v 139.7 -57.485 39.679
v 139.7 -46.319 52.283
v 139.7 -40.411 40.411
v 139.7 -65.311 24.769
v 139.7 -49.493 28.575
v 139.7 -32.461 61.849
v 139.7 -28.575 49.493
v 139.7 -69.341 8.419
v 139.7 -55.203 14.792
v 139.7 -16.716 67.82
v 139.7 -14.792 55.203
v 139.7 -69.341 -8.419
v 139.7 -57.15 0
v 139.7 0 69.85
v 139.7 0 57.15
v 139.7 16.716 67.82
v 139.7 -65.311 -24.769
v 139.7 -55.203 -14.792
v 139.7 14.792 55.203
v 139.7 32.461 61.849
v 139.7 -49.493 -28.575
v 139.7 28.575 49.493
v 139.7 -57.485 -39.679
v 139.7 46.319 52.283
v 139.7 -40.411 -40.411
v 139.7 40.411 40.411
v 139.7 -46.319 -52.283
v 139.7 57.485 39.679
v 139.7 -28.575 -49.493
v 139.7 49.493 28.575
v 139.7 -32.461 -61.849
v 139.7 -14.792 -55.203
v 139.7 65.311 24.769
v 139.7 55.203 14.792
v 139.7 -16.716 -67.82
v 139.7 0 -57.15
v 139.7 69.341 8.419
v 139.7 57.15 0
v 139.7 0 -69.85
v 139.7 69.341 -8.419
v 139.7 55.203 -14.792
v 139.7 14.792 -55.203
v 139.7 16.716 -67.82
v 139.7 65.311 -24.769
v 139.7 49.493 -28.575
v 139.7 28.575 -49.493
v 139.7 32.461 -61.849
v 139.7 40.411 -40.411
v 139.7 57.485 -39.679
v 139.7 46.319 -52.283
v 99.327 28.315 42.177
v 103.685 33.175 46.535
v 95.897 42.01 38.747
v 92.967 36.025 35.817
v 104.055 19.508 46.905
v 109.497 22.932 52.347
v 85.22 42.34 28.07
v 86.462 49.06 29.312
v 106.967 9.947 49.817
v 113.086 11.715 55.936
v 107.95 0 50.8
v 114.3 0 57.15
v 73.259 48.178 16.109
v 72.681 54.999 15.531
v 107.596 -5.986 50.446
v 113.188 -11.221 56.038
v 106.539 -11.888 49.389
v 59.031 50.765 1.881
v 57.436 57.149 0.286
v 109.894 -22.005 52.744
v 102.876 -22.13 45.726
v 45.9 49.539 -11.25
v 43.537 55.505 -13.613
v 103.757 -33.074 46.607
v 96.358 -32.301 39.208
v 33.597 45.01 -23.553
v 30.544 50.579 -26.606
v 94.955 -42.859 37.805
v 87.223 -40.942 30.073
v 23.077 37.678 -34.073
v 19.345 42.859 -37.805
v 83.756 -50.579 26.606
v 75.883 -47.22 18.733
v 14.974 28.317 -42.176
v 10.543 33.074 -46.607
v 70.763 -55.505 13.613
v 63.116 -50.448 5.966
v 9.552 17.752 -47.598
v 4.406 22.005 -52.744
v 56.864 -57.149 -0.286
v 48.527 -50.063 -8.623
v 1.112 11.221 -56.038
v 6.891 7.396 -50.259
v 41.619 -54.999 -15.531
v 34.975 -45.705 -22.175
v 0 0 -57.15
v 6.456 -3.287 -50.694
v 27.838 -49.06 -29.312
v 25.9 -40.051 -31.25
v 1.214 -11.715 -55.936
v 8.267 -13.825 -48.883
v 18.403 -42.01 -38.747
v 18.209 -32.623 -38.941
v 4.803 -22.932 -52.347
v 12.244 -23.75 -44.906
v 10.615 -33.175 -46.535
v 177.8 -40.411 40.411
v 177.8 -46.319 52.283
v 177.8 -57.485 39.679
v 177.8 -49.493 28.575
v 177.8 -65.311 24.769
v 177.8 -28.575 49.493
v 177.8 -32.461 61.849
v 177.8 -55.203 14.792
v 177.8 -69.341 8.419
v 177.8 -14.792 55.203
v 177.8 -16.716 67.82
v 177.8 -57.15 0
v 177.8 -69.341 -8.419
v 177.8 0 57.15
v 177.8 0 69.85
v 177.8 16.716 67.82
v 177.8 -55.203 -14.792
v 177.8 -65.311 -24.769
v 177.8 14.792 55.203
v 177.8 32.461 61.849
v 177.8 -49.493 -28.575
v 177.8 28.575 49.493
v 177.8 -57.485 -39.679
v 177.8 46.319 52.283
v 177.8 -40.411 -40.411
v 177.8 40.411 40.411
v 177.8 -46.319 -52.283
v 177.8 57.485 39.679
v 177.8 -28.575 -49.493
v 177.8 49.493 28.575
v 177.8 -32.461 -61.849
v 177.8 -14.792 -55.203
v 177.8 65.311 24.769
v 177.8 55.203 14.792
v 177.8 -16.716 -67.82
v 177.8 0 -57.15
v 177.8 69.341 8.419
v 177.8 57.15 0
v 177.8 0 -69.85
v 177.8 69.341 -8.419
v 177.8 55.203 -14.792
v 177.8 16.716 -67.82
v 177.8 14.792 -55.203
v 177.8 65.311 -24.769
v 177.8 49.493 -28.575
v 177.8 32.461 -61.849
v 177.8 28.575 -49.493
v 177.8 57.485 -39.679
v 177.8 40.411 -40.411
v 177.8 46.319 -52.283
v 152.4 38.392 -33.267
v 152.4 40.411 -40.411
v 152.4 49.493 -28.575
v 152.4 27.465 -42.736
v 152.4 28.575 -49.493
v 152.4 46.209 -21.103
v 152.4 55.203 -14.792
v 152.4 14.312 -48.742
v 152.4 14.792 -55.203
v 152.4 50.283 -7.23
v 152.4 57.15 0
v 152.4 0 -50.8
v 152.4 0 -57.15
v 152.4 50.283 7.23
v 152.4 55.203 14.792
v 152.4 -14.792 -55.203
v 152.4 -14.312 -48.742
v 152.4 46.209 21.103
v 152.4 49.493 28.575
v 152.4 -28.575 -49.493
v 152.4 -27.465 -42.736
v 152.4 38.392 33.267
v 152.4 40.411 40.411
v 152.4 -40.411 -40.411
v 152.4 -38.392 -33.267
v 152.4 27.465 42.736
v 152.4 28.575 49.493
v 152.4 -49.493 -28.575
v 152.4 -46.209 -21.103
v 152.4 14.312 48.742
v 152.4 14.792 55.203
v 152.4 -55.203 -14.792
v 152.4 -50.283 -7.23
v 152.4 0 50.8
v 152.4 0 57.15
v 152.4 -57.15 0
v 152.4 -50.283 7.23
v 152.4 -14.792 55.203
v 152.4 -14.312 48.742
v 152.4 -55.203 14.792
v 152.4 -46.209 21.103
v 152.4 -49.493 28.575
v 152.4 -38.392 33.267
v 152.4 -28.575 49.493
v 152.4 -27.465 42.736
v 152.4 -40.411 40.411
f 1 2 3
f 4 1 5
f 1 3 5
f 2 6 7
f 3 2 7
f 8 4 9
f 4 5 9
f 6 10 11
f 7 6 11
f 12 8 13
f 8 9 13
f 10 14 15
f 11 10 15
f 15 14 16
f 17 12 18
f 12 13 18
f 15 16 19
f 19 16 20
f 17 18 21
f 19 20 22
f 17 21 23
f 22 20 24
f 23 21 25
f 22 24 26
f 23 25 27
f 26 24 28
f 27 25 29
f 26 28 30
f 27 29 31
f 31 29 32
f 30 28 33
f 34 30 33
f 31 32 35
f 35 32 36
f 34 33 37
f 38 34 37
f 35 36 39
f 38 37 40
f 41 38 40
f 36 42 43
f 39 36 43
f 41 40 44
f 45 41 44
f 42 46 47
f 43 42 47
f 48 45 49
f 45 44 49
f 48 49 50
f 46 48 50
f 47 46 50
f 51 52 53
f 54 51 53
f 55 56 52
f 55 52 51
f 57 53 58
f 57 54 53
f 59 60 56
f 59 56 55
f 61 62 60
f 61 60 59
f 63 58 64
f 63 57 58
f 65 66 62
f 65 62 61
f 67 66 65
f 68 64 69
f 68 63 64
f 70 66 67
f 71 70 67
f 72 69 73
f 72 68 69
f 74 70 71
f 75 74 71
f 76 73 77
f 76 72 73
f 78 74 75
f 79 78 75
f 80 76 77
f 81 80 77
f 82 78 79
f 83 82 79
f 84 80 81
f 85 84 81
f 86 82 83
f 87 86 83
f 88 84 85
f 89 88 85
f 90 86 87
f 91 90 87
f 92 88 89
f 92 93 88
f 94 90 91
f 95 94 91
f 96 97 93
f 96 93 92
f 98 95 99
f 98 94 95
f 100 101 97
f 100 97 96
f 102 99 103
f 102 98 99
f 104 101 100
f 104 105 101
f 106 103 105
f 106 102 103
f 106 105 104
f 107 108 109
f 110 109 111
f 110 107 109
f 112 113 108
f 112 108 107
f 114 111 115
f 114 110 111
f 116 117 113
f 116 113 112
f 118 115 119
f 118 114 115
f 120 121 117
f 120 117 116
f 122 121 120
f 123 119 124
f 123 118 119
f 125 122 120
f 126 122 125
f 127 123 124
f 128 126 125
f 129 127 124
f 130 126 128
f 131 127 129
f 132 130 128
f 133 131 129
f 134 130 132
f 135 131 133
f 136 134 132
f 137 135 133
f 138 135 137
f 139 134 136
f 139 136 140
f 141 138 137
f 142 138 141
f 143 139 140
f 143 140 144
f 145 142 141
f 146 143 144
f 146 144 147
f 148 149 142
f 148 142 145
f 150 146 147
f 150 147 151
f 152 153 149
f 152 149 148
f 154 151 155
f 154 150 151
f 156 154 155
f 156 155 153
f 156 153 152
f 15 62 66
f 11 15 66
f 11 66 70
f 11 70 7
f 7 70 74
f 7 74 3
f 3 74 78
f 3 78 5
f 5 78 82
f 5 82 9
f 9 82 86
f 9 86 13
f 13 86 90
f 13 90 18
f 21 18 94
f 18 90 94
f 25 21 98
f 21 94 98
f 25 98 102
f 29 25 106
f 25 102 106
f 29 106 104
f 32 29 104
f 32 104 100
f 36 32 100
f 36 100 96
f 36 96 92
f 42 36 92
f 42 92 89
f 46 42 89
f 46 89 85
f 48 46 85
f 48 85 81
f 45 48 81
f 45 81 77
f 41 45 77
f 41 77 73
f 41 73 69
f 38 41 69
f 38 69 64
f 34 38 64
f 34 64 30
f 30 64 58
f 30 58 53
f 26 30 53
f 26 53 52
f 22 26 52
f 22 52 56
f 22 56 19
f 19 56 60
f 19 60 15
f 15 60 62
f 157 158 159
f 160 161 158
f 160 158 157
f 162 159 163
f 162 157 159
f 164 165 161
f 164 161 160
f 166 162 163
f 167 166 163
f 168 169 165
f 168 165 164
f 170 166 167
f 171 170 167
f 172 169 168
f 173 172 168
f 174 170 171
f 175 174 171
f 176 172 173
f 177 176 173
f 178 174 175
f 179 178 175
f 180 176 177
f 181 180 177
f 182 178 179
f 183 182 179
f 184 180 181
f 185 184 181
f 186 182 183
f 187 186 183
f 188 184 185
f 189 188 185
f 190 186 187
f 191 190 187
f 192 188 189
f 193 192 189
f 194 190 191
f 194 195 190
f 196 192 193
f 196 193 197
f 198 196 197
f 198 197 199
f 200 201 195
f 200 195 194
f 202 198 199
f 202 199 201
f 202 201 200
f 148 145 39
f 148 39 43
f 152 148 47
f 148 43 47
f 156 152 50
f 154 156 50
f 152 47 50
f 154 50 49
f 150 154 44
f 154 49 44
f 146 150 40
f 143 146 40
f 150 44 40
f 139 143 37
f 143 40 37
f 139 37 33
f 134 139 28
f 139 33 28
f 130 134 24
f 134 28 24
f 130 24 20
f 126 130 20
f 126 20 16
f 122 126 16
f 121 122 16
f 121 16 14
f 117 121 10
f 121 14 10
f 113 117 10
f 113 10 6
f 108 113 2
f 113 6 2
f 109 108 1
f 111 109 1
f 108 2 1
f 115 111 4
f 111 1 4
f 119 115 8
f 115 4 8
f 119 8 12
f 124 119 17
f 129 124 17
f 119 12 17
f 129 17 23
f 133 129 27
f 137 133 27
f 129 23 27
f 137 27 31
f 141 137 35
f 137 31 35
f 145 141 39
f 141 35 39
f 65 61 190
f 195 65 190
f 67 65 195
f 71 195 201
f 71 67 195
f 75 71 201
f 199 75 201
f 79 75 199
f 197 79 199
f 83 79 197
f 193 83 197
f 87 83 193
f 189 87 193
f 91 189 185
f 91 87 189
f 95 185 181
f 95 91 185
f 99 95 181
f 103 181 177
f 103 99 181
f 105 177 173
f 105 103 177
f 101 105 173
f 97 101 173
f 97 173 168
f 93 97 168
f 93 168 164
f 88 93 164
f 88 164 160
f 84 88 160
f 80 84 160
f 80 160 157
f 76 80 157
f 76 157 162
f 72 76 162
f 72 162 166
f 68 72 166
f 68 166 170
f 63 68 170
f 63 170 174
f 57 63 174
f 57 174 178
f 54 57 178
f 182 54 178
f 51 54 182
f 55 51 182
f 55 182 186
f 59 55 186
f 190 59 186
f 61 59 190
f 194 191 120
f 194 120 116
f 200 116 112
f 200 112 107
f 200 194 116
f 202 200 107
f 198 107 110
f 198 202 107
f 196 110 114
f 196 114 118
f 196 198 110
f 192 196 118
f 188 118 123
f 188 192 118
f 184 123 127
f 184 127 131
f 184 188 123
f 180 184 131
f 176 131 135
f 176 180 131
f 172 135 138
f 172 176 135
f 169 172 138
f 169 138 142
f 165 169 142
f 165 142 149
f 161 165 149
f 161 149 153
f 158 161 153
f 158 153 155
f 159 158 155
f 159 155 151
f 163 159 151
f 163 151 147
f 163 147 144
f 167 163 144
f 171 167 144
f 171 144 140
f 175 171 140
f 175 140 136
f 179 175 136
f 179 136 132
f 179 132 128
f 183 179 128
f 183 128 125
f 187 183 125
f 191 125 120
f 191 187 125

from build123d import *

# Parameters (mm, degrees)
SKETCH3_R                = 57.15
SKETCH3_R_2              = 50.8
BOSS_EXTRUDE2_DEPTH      = 152.4
BOSS_EXTRUDE3_DEPTH      = 25.4
BOSS_EXTRUDE3_DEPTH_BACK = 12.7
SKETCH4_R                = 69.85
SKETCH4_R_2              = 57.15
CUT_EXTRUDE1_DEPTH       = 127
CUT_EXTRUDE1_DEPTH_BACK  = 127


with BuildPart() as part:
    # Sketch3 → Boss-Extrude2 (new body)
    with BuildSketch(Plane(origin=(0, 0, 0), x_dir=(0, 0, -1), z_dir=(1, 0, 0))):
        Circle(SKETCH3_R)
        Circle(SKETCH3_R_2, mode=Mode.SUBTRACT)
    extrude(amount=BOSS_EXTRUDE2_DEPTH)

    # Sketch4 → Boss-Extrude3 (add, two sides: drawn at the far end of the back side and taken through both)
    with BuildSketch(Plane(origin=(152.4, 0, 0), x_dir=(0, 0, -1), z_dir=(1, 0, 0)).offset(-BOSS_EXTRUDE3_DEPTH_BACK)):
        Circle(SKETCH4_R)
        Circle(SKETCH4_R_2, mode=Mode.SUBTRACT)
    extrude(amount=BOSS_EXTRUDE3_DEPTH + BOSS_EXTRUDE3_DEPTH_BACK)

    # Sketch5 → Cut-Extrude1 (cut, two sides: drawn at the far end of the back side and taken through both)
    with BuildSketch(Plane(origin=(0, 0, 0), x_dir=(1, 0, 0), z_dir=(0, 1, 0)).offset(-CUT_EXTRUDE1_DEPTH_BACK)):
        Polygon((0, -57.15), (114.3, -57.15), (0, 57.15), align=None)
    extrude(amount=CUT_EXTRUDE1_DEPTH + CUT_EXTRUDE1_DEPTH_BACK, mode=Mode.SUBTRACT)


solid = part.part
